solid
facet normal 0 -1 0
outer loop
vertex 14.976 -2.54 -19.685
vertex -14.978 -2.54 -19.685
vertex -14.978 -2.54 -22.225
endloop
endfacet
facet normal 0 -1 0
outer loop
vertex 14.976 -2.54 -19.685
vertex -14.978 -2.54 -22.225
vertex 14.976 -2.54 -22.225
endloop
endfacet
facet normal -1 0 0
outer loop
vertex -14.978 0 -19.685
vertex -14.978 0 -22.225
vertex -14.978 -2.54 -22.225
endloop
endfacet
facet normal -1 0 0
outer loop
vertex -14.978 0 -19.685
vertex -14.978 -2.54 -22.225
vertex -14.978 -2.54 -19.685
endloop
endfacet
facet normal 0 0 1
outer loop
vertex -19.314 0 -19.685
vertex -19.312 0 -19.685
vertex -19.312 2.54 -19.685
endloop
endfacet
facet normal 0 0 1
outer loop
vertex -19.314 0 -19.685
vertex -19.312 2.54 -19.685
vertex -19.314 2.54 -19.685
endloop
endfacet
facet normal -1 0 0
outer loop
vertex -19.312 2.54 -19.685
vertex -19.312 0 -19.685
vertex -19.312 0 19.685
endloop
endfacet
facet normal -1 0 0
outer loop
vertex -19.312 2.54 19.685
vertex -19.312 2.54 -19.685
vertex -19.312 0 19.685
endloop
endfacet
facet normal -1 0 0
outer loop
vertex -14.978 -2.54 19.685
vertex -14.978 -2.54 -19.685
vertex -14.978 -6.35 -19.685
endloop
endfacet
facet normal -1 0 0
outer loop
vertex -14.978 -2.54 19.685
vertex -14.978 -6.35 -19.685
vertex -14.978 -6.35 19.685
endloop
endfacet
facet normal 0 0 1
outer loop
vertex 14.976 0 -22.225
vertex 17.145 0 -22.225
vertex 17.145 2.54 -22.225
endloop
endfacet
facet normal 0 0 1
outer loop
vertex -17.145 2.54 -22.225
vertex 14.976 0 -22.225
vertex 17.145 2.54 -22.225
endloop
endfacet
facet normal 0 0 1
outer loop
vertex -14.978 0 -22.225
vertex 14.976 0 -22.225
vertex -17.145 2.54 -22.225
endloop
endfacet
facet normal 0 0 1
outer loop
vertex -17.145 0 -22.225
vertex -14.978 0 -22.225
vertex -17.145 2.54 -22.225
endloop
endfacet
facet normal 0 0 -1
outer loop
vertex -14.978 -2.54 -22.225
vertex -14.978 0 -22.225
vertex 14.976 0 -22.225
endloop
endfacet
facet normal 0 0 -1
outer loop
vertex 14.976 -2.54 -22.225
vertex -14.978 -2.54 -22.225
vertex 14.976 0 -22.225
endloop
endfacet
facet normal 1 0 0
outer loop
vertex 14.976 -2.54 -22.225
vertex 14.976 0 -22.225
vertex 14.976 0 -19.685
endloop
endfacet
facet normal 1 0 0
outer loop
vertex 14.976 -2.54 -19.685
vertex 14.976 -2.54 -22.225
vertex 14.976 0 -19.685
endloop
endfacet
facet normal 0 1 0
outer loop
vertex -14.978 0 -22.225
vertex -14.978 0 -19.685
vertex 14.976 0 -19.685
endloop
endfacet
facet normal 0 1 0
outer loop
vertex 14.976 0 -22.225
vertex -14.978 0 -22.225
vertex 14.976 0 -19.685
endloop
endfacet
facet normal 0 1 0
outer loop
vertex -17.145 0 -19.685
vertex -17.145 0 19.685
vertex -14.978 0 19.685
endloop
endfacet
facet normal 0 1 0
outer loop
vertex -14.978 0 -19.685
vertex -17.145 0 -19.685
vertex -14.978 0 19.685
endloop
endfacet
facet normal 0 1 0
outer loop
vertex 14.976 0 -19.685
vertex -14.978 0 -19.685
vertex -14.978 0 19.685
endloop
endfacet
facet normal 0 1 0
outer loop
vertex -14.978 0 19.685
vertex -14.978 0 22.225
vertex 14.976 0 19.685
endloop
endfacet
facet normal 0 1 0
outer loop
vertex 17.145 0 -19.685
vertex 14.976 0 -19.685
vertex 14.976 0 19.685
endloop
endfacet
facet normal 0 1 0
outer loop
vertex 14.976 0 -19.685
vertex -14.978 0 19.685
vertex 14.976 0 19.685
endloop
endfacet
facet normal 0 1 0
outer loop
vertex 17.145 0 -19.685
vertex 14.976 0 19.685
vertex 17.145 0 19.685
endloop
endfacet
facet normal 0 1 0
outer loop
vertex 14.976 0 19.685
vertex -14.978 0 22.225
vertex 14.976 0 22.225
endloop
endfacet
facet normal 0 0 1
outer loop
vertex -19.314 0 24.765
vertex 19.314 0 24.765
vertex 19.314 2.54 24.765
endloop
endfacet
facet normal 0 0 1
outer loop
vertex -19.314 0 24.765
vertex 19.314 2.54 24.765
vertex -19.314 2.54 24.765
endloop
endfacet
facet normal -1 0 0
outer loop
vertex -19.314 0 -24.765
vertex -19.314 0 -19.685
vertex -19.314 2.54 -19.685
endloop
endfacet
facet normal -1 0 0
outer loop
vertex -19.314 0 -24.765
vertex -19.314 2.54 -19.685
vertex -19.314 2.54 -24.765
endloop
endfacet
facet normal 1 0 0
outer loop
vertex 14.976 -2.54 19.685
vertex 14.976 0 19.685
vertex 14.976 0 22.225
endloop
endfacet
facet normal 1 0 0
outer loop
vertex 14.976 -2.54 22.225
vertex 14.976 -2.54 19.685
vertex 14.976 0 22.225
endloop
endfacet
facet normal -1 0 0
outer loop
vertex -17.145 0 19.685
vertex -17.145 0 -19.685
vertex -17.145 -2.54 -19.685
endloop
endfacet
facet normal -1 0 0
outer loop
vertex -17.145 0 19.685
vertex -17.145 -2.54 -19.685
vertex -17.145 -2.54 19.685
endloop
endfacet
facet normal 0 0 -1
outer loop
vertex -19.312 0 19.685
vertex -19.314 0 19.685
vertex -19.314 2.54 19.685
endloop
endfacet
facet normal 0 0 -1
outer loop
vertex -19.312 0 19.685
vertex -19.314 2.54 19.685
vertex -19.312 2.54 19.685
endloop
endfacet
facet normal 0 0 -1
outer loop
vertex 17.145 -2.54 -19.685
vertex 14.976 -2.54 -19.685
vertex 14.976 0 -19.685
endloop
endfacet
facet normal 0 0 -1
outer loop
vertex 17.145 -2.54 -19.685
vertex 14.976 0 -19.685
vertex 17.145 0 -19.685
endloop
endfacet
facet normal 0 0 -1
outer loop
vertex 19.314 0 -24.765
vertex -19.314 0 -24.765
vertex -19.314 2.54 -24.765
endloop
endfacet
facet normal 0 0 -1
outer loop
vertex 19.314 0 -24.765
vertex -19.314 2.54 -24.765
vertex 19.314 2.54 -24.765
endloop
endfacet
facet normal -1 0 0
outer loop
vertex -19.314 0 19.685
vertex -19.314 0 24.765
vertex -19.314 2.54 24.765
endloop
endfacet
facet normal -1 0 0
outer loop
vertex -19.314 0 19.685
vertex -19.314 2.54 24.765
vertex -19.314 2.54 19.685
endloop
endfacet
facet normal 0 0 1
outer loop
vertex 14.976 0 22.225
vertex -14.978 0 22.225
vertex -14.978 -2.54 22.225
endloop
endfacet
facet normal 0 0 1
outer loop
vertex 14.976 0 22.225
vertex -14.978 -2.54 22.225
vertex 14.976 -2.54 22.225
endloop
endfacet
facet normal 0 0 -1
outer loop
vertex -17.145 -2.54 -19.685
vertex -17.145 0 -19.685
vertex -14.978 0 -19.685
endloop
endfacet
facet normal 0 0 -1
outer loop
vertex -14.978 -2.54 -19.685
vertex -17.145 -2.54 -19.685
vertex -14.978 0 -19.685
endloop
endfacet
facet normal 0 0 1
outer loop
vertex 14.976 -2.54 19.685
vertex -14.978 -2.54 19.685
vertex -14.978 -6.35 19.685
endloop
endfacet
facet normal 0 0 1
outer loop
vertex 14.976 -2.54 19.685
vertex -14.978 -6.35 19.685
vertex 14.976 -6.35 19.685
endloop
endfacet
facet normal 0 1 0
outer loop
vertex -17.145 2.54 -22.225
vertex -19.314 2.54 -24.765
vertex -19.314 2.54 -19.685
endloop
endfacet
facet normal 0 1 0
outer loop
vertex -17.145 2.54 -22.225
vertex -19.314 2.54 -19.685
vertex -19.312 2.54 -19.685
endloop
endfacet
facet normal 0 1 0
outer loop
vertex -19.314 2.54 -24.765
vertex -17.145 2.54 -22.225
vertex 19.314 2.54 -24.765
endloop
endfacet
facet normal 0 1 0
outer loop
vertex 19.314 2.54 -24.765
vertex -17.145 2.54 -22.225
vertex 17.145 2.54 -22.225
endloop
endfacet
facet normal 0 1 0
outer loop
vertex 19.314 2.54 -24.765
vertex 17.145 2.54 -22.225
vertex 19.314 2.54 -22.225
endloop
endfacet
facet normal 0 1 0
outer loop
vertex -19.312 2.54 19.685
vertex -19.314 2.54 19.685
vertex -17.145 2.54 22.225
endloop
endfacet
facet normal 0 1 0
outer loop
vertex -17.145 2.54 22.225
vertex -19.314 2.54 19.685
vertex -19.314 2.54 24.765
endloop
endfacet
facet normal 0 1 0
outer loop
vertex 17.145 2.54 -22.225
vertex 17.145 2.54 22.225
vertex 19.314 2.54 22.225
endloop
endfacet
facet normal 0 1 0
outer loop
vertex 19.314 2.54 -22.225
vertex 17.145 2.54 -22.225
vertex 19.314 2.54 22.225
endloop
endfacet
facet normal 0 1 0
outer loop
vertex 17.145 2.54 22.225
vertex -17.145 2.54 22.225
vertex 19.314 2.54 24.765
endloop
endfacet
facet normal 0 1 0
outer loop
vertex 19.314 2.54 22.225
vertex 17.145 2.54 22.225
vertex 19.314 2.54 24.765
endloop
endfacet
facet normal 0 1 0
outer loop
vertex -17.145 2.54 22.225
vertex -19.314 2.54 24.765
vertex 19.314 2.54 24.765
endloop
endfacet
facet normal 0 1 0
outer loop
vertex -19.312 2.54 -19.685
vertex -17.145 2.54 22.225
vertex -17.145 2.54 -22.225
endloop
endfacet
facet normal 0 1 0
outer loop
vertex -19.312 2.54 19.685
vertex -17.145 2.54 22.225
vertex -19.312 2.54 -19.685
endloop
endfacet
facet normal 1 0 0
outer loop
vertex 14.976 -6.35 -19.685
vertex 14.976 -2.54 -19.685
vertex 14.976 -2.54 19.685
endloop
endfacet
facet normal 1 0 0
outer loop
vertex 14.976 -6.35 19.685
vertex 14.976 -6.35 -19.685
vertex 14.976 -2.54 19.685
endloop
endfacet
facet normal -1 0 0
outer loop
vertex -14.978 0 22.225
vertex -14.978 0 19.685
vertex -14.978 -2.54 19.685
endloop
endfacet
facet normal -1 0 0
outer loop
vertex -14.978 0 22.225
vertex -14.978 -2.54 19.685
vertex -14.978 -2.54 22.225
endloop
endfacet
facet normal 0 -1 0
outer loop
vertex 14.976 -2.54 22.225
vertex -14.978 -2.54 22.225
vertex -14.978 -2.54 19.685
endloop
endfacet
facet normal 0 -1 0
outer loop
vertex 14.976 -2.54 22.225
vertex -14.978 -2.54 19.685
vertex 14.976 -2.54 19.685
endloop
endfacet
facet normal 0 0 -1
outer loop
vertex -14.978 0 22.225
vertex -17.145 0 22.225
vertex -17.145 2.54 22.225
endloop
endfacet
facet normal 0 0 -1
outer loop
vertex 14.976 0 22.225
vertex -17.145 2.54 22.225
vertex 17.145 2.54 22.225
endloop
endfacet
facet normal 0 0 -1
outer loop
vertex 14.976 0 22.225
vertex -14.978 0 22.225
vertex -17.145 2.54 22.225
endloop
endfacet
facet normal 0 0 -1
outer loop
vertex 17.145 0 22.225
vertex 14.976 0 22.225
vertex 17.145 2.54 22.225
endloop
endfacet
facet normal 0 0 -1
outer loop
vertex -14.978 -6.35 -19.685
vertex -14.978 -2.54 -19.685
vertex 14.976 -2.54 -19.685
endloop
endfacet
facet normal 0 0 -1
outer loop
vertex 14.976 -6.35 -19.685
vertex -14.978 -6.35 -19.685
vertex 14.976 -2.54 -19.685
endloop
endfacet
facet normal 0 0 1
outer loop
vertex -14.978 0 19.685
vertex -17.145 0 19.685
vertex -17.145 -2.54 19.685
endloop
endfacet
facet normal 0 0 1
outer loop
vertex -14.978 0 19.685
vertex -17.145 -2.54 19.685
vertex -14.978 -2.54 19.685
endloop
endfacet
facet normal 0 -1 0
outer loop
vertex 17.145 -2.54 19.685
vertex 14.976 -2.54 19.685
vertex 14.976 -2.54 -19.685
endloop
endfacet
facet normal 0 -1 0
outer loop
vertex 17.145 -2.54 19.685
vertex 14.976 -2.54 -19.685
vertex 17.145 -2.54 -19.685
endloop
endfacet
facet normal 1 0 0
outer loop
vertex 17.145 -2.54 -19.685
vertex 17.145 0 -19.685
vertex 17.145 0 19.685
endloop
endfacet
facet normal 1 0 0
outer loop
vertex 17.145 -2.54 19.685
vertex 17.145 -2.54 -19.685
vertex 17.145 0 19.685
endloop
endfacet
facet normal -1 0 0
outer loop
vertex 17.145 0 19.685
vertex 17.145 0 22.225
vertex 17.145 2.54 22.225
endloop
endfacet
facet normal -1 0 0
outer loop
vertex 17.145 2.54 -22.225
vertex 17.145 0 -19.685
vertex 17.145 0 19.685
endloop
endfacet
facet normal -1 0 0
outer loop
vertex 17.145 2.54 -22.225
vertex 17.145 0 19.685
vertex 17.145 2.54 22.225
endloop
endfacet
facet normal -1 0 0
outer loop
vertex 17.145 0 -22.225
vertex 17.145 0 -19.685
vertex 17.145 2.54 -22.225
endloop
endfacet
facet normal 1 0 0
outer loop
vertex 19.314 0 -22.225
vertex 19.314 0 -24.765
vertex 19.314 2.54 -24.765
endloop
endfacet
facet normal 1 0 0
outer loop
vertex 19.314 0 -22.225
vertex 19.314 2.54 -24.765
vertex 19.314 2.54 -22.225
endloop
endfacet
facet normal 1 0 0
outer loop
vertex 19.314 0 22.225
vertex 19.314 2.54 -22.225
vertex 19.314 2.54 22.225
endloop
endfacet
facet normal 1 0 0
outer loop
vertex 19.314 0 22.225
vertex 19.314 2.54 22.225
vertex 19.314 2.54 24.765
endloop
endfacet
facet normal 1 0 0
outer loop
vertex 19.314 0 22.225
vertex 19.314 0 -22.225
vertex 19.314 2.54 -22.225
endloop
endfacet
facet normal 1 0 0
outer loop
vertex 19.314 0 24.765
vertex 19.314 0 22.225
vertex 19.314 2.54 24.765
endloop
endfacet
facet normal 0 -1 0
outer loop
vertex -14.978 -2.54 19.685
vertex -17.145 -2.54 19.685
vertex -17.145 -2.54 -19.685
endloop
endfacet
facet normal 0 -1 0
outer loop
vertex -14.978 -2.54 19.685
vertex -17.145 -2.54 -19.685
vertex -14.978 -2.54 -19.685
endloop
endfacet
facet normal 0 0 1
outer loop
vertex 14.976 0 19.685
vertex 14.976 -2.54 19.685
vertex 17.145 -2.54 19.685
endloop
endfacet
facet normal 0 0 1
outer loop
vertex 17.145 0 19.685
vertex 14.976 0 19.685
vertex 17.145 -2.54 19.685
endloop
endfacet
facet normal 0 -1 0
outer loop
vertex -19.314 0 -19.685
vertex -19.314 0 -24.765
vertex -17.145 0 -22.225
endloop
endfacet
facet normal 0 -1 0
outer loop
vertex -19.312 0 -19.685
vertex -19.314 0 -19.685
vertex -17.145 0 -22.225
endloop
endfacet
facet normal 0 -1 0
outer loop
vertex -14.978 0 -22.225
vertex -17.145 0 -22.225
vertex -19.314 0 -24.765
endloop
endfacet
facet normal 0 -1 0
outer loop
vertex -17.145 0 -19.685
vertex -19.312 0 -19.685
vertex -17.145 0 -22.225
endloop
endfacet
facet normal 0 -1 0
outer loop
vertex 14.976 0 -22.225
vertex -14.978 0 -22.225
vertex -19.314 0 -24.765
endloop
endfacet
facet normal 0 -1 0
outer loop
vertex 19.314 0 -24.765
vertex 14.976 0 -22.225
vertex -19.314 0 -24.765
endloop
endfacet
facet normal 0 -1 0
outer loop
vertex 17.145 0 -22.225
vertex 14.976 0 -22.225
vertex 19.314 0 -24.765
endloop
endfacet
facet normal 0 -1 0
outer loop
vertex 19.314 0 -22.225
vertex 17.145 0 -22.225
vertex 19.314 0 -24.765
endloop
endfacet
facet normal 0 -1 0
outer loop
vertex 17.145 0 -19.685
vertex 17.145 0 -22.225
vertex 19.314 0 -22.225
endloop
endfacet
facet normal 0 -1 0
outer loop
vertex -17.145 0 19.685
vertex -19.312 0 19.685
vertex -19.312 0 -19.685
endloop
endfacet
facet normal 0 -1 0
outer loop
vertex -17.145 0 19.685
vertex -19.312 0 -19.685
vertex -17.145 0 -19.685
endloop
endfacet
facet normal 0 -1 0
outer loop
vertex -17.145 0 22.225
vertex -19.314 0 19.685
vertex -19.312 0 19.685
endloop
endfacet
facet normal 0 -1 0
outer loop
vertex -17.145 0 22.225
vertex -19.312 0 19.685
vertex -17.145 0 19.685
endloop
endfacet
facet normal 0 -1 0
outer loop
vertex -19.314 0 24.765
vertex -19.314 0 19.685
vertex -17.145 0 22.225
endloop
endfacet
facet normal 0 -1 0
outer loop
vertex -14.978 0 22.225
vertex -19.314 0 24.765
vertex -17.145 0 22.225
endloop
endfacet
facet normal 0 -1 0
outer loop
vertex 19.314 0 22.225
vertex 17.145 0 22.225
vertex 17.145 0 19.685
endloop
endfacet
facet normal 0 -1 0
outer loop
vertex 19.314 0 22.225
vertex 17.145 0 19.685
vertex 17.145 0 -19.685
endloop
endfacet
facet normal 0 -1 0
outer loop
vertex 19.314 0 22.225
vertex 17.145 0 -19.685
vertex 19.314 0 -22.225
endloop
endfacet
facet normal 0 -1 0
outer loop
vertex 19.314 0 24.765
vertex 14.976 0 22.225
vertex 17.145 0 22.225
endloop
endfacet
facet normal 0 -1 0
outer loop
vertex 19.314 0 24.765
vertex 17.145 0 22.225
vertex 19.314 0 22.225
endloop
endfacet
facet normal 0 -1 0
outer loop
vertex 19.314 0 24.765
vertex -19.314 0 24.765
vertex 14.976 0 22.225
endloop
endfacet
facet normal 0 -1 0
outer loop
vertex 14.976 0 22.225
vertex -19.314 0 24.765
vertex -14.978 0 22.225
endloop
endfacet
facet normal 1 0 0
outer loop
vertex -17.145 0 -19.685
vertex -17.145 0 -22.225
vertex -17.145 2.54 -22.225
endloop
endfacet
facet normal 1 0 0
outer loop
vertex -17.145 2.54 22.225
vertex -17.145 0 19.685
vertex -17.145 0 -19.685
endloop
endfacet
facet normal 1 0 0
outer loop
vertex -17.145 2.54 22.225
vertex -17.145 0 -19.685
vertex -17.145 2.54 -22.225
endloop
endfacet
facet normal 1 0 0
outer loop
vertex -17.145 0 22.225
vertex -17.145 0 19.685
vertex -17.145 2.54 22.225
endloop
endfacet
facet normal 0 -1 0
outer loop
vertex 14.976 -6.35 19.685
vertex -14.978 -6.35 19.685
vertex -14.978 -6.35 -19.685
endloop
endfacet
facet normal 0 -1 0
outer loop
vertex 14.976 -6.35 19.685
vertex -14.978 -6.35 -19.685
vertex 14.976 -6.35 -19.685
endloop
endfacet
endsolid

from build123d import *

# Parameters (mm, degrees)
F0_W     = 29.9539973129
F0_H     = 39.37
F1_DEPTH = 6.35
F0_W_2   = 2.1686380141
F0_H_2   = 2.54
F0_W_3   = 2.167364673
F2_DEPTH = 2.54
F3_DEPTH = 2.54


with BuildPart() as f1:
    # F0 (on Front) → F1 (new body)
    with BuildSketch(Plane.XZ):
        with Locations((-0.0006366705, 0)):
            Rectangle(F0_W, F0_H)
    extrude(amount=F1_DEPTH)



with BuildPart() as f2:
    # F0 (on Front) → F2 (new body)
    with BuildSketch(Plane.XZ):
        Polygon((19.3136380141, -22.225), (17.145, -22.225), (14.9763619859, -22.225), (-14.977635327, -22.225), (-17.145, -22.225), (-19.312364673, -22.225), (-19.312364673, -19.685), (-19.3136380141, -19.685), (-19.3136380141, -24.765), (19.3136380141, -24.765), align=None)
        with Locations((18.2293190071, -20.955)):
            Rectangle(F0_W_2, F0_H_2)
        with Locations((18.2293190071, 0)):
            Rectangle(F0_W_2, F0_H)
        with Locations((18.2293190071, 20.955)):
            Rectangle(F0_W_2, F0_H_2)
        with Locations((-18.2286823365, -20.955)):
            Rectangle(F0_W_3, F0_H_2)
        Polygon((14.9763619859, 22.225), (17.145, 22.225), (19.3136380141, 22.225), (19.3136380141, 24.765), (-19.3136380141, 24.765), (-19.3136380141, 19.685), (-19.312364673, 19.685), (-19.312364673, 22.225), (-17.145, 22.225), (-14.977635327, 22.225), align=None)
        with Locations((-18.2286823365, 0)):
            Rectangle(F0_W_3, F0_H)
        with Locations((-18.2286823365, 20.955)):
            Rectangle(F0_W_3, F0_H_2)
    extrude(amount=-F2_DEPTH)


with BuildPart() as f1_1:
    add(f1.part)

    add(f2.part)  # F3 merges F2
    # F0 (on Front) → F3 (join)
    with BuildSketch(Plane.XZ):
        with Locations((-0.0006366705, 20.955)):
            Rectangle(F0_W, F0_H_2)
        with Locations((16.0606809929, 0)):
            Rectangle(F0_W_2, F0_H)
        with Locations((-0.0006366705, -20.955)):
            Rectangle(F0_W, F0_H_2)
        with Locations((-16.0613176635, 0)):
            Rectangle(F0_W_3, F0_H)
    extrude(amount=F3_DEPTH)


solid = f1_1.part
